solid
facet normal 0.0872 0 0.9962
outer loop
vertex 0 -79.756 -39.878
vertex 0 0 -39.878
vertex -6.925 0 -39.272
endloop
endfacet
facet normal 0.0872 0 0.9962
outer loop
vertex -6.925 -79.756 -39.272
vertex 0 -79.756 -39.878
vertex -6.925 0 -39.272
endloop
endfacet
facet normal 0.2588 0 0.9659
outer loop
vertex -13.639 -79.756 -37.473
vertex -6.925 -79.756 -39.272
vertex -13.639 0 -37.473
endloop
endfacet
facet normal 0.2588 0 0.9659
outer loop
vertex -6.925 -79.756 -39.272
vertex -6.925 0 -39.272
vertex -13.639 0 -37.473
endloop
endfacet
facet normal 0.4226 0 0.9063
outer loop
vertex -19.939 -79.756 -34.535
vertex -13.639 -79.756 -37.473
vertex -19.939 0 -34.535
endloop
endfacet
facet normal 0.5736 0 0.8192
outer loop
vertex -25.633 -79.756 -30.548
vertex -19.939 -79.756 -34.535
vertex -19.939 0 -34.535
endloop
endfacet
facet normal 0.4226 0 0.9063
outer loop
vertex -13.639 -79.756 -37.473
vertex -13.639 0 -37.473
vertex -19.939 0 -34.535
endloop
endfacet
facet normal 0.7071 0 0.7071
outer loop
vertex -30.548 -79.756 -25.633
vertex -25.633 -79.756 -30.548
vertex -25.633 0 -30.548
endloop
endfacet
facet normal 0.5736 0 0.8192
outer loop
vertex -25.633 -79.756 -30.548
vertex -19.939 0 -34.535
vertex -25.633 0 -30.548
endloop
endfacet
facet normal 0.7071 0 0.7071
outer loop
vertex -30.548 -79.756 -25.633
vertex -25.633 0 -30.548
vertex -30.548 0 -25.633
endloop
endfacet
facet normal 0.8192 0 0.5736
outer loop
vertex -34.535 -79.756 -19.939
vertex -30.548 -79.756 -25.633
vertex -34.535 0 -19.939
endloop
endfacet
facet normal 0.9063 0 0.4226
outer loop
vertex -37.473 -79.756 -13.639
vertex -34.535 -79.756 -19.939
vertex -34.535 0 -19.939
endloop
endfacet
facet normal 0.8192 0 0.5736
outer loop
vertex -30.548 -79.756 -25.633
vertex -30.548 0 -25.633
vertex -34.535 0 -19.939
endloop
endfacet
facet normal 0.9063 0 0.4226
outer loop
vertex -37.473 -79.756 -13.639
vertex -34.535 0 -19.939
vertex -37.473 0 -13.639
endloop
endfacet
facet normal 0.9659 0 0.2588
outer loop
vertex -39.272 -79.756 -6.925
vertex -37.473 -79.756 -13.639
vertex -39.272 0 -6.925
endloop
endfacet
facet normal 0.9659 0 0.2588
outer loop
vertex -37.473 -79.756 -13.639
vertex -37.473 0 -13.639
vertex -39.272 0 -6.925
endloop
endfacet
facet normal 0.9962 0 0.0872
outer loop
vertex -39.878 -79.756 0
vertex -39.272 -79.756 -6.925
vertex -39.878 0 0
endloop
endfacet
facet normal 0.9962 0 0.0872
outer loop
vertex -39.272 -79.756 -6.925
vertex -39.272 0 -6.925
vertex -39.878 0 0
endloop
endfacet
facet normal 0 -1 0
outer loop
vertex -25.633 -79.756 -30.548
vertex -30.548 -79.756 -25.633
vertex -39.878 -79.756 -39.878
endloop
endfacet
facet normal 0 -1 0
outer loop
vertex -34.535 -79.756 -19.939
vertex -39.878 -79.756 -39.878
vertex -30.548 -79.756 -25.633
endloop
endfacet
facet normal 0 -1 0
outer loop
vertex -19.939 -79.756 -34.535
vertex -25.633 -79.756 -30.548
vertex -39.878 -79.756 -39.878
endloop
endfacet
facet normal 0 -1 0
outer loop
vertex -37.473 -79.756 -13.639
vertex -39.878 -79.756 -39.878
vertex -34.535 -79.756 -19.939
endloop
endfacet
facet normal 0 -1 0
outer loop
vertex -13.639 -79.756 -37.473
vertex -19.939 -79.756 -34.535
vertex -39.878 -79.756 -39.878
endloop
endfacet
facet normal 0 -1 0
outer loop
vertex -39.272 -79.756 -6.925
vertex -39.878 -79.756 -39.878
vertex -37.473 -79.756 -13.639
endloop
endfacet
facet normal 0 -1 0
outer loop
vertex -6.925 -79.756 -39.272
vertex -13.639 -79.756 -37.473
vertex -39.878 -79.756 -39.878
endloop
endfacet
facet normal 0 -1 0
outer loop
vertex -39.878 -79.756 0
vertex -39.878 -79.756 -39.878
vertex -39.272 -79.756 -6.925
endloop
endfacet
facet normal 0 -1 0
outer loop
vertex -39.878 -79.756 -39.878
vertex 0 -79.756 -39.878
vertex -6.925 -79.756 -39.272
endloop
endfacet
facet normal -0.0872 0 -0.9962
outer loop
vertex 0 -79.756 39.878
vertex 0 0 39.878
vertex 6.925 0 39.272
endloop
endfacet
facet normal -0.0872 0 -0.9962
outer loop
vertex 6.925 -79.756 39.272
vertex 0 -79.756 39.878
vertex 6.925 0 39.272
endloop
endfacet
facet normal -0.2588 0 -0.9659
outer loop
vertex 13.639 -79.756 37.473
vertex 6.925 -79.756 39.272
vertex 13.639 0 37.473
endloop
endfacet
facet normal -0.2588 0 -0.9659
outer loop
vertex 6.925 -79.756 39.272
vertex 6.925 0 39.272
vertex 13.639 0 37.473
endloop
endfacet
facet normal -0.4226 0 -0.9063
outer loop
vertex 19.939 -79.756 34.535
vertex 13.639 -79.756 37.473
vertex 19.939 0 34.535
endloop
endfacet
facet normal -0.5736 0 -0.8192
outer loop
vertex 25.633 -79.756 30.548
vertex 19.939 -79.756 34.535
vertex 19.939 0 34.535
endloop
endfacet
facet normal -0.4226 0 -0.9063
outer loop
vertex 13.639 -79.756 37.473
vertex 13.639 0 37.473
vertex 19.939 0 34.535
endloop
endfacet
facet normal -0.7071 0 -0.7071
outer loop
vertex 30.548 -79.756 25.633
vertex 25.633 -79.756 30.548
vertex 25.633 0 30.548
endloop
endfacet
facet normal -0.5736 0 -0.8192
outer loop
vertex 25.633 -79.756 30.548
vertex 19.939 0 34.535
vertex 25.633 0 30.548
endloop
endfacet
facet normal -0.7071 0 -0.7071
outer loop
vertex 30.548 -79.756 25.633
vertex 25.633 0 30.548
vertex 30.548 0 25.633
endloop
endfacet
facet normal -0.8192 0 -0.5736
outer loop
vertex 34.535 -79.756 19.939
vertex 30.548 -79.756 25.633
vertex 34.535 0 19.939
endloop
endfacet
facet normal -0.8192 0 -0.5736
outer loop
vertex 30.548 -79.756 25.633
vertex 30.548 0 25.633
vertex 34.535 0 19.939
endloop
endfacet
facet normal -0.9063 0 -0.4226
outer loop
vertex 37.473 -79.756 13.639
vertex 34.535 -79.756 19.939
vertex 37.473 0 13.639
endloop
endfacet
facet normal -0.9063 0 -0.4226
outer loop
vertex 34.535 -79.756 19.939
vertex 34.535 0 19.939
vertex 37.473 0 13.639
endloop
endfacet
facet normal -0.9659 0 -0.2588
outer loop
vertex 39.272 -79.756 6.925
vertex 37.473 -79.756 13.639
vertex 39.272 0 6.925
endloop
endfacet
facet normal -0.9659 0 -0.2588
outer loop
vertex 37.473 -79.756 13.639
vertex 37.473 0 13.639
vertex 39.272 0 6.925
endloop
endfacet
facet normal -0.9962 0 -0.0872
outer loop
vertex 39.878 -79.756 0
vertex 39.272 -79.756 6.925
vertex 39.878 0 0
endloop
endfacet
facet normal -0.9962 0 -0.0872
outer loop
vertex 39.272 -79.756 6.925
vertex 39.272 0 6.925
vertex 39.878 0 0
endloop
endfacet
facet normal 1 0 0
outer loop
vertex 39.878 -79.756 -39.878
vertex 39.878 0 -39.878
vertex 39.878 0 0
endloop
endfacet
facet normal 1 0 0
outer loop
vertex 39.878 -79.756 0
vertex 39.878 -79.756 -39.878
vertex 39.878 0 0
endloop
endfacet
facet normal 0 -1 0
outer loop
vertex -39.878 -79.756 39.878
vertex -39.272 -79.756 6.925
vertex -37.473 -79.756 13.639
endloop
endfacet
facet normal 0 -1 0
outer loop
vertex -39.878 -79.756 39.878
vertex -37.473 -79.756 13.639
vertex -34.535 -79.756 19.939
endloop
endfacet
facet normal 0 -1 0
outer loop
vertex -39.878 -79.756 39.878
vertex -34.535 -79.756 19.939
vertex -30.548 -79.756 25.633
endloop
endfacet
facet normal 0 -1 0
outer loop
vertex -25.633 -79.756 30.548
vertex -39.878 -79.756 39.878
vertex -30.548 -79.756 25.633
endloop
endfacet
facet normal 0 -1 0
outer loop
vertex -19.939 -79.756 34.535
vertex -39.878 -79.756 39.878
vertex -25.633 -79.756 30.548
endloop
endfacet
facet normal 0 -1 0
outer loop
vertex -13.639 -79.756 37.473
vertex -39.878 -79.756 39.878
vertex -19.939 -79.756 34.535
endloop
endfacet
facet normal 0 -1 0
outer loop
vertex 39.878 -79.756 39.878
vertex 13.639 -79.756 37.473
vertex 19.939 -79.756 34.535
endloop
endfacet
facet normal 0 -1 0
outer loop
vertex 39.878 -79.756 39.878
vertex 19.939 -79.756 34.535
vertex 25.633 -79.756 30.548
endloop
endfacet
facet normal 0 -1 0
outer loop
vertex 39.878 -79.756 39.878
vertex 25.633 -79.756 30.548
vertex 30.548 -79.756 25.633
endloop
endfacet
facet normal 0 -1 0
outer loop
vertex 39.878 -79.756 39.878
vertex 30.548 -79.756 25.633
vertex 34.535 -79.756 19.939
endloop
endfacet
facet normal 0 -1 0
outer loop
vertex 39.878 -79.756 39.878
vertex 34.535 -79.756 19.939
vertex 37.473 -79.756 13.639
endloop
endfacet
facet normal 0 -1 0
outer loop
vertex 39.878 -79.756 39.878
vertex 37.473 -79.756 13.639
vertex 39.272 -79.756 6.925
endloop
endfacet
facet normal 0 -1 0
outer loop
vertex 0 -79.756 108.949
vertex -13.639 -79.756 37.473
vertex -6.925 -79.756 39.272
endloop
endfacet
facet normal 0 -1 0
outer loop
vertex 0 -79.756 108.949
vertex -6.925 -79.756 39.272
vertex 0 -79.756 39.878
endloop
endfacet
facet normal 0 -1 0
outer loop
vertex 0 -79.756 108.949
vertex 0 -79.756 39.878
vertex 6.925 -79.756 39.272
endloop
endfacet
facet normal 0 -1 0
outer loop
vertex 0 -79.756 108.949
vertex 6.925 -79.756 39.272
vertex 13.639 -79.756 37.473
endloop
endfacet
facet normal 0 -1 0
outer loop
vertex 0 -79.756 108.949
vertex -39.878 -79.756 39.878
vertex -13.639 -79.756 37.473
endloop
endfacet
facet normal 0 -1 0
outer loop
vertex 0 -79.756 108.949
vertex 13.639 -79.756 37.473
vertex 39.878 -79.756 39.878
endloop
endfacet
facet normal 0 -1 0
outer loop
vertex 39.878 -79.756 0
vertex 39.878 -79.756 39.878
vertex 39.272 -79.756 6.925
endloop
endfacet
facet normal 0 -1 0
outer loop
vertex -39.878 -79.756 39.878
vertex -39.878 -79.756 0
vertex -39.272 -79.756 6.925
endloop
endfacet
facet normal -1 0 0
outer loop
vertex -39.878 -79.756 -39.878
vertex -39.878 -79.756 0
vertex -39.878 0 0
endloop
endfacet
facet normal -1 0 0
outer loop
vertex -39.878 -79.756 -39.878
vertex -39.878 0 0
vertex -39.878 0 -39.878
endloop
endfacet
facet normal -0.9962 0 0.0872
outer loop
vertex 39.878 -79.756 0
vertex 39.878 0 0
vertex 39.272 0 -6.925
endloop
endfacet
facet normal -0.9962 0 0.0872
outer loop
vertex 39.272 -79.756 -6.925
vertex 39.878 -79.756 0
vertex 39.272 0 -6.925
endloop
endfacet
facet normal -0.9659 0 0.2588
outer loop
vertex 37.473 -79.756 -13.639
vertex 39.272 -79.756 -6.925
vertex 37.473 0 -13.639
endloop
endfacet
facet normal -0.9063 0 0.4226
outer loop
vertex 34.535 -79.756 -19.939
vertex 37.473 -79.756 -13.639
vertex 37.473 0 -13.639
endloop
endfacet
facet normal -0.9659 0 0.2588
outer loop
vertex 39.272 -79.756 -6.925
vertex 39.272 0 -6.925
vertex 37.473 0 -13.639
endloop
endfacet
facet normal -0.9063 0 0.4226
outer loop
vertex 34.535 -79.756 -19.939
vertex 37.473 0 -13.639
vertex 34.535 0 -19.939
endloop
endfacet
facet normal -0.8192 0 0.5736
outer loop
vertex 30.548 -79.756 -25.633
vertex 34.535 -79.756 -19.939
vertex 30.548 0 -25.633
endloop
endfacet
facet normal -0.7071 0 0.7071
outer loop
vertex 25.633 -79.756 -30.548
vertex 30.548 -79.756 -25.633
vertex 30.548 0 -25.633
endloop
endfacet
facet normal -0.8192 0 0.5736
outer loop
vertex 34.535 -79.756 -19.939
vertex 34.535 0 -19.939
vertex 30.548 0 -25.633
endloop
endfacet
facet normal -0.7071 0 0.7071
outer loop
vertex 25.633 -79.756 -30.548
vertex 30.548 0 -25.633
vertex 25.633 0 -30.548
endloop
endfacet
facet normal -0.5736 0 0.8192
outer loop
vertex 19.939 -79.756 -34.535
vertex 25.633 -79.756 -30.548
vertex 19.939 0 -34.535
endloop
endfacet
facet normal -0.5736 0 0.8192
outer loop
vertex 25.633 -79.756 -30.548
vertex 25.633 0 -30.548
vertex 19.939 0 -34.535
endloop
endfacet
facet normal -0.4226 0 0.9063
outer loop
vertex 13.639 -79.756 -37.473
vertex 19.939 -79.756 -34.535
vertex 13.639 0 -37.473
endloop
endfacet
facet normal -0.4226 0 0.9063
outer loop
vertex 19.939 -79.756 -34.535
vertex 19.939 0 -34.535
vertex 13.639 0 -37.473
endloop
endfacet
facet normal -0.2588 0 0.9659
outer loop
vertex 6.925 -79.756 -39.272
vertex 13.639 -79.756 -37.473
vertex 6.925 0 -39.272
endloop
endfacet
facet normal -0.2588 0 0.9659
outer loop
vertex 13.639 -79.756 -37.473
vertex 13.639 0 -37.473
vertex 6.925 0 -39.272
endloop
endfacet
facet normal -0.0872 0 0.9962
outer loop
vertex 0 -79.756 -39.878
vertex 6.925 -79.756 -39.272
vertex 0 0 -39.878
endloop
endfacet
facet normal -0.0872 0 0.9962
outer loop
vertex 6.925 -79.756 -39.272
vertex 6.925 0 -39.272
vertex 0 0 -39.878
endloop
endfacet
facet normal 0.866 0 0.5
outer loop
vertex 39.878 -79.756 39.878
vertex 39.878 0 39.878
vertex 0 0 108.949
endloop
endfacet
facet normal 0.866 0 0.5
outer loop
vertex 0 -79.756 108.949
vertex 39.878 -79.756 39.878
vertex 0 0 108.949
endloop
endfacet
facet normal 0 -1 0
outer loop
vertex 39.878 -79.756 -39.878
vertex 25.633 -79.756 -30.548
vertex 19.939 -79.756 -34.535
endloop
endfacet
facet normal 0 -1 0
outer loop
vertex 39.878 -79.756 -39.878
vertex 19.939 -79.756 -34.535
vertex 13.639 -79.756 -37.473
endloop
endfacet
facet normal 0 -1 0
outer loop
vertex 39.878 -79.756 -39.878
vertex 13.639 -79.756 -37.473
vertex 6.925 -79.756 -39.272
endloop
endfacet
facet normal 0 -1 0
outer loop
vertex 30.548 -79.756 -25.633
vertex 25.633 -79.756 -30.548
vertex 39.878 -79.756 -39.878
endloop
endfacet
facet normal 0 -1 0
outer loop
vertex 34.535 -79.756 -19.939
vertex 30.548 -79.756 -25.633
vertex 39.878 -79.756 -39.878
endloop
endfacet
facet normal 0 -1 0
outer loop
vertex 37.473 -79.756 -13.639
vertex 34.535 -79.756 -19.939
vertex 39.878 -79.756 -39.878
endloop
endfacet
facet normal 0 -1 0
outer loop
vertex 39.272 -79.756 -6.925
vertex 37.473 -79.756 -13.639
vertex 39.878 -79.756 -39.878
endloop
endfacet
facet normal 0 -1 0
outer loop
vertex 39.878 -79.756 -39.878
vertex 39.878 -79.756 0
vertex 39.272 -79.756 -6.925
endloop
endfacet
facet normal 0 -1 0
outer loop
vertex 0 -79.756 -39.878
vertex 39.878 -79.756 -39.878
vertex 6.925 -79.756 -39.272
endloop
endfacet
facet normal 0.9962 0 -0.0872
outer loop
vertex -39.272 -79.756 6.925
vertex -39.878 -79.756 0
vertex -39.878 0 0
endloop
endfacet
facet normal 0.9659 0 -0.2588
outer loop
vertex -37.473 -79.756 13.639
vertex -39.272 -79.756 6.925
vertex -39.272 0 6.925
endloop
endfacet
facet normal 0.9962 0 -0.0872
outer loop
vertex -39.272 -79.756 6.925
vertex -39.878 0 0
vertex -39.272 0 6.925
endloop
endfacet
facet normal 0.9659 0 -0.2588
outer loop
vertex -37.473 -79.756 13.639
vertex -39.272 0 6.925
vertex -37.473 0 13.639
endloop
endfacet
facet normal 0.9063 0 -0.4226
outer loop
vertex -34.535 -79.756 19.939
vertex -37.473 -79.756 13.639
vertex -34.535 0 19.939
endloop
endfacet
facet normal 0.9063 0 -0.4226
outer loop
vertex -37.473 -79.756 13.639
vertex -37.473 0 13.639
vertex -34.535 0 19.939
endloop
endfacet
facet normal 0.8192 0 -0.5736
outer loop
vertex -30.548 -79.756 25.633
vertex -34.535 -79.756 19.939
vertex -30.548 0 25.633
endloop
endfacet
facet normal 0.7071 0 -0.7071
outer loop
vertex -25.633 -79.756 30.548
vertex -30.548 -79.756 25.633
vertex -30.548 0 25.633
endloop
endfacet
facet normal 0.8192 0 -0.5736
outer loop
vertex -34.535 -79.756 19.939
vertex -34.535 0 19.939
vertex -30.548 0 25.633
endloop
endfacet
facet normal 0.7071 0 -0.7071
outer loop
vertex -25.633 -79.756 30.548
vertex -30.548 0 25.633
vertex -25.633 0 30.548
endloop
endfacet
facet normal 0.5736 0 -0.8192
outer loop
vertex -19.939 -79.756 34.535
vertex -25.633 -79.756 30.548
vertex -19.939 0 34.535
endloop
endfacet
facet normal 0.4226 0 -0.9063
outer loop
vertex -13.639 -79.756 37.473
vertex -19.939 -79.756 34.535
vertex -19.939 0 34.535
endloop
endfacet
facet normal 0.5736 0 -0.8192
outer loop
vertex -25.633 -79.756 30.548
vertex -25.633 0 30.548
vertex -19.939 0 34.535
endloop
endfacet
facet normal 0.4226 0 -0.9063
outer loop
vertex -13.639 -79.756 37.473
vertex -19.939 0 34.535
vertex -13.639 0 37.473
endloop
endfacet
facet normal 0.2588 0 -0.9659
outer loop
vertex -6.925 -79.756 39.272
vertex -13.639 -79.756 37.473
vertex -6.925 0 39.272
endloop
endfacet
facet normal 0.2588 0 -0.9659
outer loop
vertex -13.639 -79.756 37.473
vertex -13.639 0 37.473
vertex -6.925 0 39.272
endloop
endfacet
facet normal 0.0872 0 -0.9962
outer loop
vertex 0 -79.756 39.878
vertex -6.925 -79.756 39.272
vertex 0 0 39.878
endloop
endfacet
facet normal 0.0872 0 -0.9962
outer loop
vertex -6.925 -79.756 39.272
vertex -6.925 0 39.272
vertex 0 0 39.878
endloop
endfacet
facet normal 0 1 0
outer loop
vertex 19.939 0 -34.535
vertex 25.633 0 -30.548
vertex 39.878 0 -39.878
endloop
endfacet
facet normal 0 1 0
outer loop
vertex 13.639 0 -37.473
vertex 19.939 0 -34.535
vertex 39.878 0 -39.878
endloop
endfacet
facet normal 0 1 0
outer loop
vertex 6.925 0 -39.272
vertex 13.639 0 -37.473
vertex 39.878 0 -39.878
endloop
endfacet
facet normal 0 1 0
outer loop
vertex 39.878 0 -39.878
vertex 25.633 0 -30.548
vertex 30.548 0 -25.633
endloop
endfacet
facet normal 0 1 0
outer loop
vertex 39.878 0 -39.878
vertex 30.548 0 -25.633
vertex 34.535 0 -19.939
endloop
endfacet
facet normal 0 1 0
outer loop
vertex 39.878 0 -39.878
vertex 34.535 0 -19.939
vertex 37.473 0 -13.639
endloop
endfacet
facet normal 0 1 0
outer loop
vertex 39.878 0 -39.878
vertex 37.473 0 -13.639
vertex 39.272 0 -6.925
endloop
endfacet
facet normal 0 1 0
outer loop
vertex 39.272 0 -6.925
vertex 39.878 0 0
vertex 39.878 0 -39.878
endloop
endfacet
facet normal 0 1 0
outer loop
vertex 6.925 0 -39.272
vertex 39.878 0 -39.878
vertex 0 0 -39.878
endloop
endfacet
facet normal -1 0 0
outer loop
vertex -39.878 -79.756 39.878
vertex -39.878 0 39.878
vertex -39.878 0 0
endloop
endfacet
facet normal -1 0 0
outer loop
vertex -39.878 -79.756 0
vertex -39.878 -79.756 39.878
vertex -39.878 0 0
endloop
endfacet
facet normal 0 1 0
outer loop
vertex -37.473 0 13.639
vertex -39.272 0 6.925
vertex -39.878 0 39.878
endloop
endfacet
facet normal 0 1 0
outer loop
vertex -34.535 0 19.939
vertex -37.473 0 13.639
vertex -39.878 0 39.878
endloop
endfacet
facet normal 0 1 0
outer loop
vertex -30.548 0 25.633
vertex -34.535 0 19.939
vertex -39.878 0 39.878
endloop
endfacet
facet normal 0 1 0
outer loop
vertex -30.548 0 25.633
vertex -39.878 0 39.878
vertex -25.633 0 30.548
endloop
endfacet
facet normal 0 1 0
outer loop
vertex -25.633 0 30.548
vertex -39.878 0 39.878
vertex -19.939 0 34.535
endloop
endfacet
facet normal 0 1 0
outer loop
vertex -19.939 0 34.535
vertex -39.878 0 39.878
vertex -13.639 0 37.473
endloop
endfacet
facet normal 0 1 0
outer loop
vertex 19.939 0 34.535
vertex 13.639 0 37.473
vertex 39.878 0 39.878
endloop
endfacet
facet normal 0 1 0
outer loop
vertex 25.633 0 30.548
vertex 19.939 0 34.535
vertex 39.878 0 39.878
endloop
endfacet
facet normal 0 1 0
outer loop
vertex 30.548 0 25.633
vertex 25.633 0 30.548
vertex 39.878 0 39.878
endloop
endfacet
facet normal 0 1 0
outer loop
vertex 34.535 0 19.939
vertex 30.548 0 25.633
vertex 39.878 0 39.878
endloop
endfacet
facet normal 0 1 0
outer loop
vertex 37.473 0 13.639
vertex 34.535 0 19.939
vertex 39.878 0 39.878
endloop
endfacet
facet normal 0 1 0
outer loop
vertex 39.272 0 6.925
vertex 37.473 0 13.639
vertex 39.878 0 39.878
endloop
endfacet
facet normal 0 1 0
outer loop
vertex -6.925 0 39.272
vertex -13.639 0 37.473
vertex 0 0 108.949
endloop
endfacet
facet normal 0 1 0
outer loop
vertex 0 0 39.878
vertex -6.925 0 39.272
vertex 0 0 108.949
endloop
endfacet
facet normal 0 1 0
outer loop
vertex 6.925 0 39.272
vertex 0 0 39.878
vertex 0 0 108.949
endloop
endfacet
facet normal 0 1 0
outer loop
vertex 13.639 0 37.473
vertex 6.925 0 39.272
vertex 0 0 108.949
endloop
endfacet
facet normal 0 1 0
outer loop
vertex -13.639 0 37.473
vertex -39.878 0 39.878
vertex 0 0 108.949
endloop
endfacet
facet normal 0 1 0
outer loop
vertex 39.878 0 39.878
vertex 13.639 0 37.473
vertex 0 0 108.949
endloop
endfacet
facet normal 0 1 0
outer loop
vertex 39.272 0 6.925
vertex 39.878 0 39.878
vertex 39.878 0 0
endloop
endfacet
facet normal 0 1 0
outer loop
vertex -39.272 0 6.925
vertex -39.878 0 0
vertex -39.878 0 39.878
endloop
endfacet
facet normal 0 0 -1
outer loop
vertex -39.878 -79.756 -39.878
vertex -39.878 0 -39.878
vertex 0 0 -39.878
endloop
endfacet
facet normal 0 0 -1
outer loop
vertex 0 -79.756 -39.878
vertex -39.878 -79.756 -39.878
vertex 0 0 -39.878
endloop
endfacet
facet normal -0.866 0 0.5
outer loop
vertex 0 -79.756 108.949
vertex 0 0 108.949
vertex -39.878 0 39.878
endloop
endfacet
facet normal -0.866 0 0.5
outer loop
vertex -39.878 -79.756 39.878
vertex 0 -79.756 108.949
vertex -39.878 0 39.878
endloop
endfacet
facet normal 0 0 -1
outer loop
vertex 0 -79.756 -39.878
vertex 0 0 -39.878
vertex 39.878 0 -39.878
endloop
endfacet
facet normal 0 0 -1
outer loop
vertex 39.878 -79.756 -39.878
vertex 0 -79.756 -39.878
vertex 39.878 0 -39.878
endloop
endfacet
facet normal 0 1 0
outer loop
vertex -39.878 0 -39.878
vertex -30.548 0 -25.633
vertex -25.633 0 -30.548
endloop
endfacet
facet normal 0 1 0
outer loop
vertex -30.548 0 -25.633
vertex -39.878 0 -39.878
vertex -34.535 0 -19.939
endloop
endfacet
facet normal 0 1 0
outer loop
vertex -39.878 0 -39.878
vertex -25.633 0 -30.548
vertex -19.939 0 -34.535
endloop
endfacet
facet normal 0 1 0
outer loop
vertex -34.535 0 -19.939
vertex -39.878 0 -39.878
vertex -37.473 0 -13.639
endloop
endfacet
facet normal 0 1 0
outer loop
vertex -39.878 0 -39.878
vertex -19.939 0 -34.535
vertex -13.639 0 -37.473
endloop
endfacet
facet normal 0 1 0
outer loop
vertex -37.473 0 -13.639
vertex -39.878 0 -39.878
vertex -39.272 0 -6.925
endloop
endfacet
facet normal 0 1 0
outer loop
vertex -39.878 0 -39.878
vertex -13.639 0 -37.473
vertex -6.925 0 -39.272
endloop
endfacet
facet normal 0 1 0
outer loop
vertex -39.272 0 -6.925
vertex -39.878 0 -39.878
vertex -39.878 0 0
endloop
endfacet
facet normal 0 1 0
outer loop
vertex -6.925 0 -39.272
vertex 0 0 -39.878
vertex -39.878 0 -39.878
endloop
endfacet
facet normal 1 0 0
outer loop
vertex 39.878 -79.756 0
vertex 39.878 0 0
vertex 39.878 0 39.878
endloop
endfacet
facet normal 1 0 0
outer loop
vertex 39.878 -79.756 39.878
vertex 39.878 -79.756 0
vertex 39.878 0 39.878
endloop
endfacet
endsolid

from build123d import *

# Parameters (mm, degrees)
F1_DEPTH = 79.756


with BuildPart() as f1:
    # F0 (on Front) → F1 (new body)
    with BuildSketch(Plane.XZ):
        with BuildLine():
            ThreePointArc((-39.878, -1.724e-07), (-28.1980042811, 28.1980041592), (0, 39.878))
            Line((0, 39.878), (-39.878, 39.878))
            Line((-39.878, 39.878), (-39.878, -1.724e-07))
        make_face()
        Polygon((0, 39.878), (39.878, 39.878), (0, 108.9487221042), (-39.878, 39.878), align=None)
        with BuildLine():
            Line((39.878, 0), (39.878, 39.878))
            Line((39.878, 39.878), (0, 39.878))
            ThreePointArc((0, 39.878), (28.1980042202, 28.1980042202), (39.878, 0))
        make_face()
    extrude(amount=F1_DEPTH)


with BuildPart() as f1b:
    # F0 (on Front) → F1, piece 2 (new body)
    with BuildSketch(Plane.XZ):
        with BuildLine():
            Line((39.878, -39.878), (39.878, 0))
            ThreePointArc((39.878, 0), (28.1980042534, -28.1980041869), (9.4e-08, -39.878))
            Line((9.4e-08, -39.878), (39.878, -39.878))
        make_face()
    extrude(amount=F1_DEPTH)


with BuildPart() as f1c:
    # F0 (on Front) → F1, piece 3 (new body)
    with BuildSketch(Plane.XZ):
        with BuildLine():
            ThreePointArc((9.4e-08, -39.878), (-28.198004126, -28.1980043144), (-39.878, -1.724e-07))
            Line((-39.878, -1.724e-07), (-39.878, -39.878))
            Line((-39.878, -39.878), (9.4e-08, -39.878))
        make_face()
    extrude(amount=F1_DEPTH)


solid = Compound([f1.part, f1b.part, f1c.part])
